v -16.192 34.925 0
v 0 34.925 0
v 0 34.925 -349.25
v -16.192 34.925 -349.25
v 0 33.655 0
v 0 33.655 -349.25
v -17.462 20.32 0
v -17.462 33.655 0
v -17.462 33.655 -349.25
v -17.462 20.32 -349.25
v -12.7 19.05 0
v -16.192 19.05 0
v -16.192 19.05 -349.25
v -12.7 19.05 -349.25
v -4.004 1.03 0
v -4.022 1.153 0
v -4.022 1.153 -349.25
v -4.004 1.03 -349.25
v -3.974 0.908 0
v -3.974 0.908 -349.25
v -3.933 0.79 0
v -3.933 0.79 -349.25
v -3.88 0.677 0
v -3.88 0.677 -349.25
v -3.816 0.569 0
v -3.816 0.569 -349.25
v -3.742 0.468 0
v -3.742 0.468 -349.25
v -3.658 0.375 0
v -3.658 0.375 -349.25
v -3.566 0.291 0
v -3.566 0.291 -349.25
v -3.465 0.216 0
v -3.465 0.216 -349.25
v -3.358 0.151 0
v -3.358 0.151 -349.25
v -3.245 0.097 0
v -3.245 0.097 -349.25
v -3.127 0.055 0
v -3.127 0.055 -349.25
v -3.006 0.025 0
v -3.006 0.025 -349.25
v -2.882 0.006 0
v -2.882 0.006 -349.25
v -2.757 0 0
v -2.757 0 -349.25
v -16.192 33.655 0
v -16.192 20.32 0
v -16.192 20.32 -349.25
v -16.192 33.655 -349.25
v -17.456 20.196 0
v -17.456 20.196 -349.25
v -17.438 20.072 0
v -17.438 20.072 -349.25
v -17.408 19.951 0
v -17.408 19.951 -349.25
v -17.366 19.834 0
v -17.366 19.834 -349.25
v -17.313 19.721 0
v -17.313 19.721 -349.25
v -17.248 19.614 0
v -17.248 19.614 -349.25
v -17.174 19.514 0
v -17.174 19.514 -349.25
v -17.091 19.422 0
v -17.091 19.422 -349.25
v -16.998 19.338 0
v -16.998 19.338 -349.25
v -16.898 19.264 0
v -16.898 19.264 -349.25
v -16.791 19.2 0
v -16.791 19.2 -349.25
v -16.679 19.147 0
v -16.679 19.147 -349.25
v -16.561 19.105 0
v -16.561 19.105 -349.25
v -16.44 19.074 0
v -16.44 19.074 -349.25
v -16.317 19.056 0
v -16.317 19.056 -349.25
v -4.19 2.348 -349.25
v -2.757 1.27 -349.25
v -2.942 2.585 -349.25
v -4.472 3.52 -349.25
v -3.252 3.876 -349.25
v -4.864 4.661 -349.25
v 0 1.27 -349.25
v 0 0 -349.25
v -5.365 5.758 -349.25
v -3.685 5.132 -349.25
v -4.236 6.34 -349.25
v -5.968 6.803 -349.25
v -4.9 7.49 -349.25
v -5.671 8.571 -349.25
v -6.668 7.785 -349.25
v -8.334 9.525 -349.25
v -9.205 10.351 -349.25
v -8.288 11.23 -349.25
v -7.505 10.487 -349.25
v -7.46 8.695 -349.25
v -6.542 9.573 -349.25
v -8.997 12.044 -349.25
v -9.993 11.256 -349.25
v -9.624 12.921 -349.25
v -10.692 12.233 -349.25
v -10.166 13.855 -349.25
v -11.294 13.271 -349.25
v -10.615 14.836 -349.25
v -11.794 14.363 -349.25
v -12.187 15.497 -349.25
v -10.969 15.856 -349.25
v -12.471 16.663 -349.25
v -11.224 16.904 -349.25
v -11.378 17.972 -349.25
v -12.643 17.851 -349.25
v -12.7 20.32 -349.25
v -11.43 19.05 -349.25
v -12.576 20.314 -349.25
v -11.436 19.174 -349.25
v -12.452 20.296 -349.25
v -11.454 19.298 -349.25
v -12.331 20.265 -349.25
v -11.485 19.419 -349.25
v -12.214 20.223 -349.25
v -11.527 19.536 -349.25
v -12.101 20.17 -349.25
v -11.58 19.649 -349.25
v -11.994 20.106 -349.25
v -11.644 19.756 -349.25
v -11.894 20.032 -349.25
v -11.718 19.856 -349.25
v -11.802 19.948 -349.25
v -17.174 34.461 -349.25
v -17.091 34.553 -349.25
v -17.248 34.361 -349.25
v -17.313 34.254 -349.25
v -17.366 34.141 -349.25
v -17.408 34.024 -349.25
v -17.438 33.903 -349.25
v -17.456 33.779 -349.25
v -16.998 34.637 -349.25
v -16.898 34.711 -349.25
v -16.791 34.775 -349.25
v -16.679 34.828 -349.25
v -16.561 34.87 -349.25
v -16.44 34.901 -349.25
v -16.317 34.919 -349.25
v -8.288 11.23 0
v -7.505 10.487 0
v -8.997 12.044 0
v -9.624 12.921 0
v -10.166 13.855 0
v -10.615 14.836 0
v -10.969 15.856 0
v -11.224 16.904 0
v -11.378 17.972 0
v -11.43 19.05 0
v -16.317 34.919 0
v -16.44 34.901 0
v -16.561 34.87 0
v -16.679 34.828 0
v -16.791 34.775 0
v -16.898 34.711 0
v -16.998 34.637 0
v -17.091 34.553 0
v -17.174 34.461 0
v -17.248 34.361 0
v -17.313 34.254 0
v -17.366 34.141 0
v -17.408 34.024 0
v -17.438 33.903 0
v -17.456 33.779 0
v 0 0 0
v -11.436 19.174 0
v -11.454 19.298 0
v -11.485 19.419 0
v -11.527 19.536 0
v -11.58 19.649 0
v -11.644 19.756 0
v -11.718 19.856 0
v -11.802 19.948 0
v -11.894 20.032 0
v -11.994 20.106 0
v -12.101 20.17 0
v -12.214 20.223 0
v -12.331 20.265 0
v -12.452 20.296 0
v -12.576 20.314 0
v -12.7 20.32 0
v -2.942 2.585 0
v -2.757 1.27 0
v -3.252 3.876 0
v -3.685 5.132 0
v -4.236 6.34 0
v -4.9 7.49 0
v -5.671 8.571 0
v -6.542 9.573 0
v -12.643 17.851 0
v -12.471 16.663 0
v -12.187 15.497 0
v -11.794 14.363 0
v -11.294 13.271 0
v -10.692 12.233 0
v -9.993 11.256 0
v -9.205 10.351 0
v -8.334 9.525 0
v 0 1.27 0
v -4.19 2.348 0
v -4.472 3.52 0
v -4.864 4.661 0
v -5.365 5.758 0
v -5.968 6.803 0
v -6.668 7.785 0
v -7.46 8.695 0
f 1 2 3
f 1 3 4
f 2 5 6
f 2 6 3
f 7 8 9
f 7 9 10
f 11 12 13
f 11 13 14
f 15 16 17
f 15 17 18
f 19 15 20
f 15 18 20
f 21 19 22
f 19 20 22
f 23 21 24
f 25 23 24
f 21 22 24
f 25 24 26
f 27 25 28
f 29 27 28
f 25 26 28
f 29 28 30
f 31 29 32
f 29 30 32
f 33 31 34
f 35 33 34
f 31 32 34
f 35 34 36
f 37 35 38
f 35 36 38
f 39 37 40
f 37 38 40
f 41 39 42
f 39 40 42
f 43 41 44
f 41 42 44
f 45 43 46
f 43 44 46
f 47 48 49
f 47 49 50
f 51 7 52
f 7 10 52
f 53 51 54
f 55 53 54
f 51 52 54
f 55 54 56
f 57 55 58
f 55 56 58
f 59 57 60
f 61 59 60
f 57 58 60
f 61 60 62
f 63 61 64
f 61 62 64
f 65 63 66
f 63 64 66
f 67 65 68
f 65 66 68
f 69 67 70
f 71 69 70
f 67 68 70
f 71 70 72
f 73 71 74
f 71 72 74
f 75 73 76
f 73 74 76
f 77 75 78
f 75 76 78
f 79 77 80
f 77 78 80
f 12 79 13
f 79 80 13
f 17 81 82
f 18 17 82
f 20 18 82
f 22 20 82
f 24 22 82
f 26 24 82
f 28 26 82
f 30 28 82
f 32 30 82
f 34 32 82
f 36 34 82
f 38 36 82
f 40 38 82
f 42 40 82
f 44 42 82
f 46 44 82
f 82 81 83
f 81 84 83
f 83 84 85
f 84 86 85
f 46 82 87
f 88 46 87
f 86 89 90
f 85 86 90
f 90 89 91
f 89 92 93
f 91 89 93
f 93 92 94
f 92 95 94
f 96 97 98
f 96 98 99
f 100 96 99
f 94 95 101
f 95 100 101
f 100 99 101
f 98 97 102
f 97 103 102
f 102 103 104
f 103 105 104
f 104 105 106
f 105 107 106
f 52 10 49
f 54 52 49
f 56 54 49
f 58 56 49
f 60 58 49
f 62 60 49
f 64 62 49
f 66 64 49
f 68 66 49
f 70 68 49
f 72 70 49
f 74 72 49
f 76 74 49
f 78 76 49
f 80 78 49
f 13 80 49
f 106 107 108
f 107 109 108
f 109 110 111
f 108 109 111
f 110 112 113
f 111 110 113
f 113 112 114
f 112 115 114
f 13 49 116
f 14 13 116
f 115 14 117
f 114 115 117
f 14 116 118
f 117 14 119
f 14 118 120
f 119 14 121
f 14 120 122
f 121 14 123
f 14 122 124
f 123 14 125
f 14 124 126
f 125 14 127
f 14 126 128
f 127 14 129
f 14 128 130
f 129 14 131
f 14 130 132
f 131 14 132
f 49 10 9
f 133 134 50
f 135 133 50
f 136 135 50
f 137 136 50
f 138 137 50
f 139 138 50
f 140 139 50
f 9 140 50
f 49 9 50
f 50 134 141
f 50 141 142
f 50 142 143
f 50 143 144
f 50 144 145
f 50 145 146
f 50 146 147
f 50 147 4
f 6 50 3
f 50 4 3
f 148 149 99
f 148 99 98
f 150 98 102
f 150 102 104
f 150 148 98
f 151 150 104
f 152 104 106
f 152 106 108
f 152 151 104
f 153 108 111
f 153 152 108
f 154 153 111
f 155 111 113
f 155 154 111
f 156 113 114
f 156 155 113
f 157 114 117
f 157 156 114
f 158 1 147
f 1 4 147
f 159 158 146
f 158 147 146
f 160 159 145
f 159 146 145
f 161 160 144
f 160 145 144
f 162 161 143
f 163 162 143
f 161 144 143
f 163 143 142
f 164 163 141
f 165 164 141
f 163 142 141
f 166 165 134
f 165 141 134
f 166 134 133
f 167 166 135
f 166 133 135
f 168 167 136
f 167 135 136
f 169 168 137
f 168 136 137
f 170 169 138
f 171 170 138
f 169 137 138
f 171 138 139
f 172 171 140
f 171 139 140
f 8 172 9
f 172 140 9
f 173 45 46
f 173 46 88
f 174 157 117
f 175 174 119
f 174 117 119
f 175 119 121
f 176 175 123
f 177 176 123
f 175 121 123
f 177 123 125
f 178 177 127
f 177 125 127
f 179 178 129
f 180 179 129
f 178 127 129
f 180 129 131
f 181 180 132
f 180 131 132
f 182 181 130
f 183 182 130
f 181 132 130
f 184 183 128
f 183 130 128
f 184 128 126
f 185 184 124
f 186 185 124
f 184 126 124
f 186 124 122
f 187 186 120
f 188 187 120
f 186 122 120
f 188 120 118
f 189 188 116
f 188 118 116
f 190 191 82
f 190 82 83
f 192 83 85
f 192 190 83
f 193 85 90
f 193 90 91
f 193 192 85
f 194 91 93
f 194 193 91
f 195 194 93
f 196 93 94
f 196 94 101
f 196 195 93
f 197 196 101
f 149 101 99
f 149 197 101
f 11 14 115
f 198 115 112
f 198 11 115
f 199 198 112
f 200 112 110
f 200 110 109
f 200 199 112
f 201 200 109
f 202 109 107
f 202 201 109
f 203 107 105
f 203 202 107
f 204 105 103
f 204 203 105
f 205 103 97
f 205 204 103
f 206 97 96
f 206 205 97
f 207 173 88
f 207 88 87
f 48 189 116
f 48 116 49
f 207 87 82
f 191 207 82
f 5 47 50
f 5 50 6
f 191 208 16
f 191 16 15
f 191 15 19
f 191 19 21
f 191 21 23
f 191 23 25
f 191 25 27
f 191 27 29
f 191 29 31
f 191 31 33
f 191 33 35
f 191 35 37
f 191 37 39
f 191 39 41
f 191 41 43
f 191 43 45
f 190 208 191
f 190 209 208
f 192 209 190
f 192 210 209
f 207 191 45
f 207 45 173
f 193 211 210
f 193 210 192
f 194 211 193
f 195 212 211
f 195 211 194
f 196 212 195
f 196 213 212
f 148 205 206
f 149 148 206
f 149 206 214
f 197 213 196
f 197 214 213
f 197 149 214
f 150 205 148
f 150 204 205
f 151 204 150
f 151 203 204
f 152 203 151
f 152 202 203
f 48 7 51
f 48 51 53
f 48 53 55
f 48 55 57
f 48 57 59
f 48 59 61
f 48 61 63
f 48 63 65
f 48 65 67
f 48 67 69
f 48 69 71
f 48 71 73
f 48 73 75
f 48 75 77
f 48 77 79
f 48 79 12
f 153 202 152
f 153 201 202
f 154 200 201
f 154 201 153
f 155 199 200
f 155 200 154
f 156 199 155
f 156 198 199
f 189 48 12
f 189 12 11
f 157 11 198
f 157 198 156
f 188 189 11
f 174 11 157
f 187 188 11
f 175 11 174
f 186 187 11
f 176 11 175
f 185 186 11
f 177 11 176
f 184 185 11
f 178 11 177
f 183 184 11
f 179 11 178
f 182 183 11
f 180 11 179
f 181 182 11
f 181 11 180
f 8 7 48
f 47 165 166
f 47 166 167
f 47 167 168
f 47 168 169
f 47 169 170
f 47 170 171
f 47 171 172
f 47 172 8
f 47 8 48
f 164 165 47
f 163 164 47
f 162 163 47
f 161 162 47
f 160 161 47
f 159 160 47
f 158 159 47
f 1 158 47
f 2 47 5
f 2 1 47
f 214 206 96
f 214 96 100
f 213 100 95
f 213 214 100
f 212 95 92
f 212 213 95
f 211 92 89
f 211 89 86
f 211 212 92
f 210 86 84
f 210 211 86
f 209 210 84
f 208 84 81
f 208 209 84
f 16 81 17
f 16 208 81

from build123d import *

# Parameters (mm, degrees)
EXTRUDE_THIN1_DEPTH = 349.25
FILLET1_R           = 1.27


with BuildPart() as part:
    # Sketch1 → Extrude-Thin1 (new body)
    with BuildSketch(Plane.XY):
        with BuildLine():
            Line((0, 34.925), (-17.4625, 34.925))
            Line((-17.4625, 34.925), (-17.4625, 19.05))
            Line((-17.4625, 19.05), (-12.7, 19.05))
            ThreePointArc((-12.7, 19.05), (-11.5566064, 13.811099671), (-8.334375, 9.525))
            ThreePointArc((-8.334375, 9.525), (-5.1121436, 5.238900329), (-3.96875, 0))
            Line((-3.96875, 0), (0, 0))
            Line((0, 0), (0, 1.27))
            Line((0, 1.27), (-2.757126928, 1.27))
            ThreePointArc((-2.757126928, 1.27), (-4.23576048, 6.339833525), (-7.505321915, 10.487065997))
            ThreePointArc((-7.505321915, 10.487065997), (-10.650811196, 14.925884165), (-11.358429664, 20.32))
            Line((-11.358429664, 20.32), (-16.1925, 20.32))
            Line((-16.1925, 20.32), (-16.1925, 33.655))
            Line((-16.1925, 33.655), (0, 33.655))
            Line((0, 33.655), (0, 34.925))
        make_face()
    extrude(amount=-EXTRUDE_THIN1_DEPTH)

    # Fillet1
    fillet1_edges = [part.edges().sort_by_distance(p)[0] for p in [
        (-3.96875, 0, -174.625),
        (-17.4625, 19.05, -174.625),
        (-17.4625, 34.925, -174.625),
        (-11.358429664, 20.32, -174.625),
    ]]
    fillet(fillet1_edges, radius=FILLET1_R)


solid = part.part
